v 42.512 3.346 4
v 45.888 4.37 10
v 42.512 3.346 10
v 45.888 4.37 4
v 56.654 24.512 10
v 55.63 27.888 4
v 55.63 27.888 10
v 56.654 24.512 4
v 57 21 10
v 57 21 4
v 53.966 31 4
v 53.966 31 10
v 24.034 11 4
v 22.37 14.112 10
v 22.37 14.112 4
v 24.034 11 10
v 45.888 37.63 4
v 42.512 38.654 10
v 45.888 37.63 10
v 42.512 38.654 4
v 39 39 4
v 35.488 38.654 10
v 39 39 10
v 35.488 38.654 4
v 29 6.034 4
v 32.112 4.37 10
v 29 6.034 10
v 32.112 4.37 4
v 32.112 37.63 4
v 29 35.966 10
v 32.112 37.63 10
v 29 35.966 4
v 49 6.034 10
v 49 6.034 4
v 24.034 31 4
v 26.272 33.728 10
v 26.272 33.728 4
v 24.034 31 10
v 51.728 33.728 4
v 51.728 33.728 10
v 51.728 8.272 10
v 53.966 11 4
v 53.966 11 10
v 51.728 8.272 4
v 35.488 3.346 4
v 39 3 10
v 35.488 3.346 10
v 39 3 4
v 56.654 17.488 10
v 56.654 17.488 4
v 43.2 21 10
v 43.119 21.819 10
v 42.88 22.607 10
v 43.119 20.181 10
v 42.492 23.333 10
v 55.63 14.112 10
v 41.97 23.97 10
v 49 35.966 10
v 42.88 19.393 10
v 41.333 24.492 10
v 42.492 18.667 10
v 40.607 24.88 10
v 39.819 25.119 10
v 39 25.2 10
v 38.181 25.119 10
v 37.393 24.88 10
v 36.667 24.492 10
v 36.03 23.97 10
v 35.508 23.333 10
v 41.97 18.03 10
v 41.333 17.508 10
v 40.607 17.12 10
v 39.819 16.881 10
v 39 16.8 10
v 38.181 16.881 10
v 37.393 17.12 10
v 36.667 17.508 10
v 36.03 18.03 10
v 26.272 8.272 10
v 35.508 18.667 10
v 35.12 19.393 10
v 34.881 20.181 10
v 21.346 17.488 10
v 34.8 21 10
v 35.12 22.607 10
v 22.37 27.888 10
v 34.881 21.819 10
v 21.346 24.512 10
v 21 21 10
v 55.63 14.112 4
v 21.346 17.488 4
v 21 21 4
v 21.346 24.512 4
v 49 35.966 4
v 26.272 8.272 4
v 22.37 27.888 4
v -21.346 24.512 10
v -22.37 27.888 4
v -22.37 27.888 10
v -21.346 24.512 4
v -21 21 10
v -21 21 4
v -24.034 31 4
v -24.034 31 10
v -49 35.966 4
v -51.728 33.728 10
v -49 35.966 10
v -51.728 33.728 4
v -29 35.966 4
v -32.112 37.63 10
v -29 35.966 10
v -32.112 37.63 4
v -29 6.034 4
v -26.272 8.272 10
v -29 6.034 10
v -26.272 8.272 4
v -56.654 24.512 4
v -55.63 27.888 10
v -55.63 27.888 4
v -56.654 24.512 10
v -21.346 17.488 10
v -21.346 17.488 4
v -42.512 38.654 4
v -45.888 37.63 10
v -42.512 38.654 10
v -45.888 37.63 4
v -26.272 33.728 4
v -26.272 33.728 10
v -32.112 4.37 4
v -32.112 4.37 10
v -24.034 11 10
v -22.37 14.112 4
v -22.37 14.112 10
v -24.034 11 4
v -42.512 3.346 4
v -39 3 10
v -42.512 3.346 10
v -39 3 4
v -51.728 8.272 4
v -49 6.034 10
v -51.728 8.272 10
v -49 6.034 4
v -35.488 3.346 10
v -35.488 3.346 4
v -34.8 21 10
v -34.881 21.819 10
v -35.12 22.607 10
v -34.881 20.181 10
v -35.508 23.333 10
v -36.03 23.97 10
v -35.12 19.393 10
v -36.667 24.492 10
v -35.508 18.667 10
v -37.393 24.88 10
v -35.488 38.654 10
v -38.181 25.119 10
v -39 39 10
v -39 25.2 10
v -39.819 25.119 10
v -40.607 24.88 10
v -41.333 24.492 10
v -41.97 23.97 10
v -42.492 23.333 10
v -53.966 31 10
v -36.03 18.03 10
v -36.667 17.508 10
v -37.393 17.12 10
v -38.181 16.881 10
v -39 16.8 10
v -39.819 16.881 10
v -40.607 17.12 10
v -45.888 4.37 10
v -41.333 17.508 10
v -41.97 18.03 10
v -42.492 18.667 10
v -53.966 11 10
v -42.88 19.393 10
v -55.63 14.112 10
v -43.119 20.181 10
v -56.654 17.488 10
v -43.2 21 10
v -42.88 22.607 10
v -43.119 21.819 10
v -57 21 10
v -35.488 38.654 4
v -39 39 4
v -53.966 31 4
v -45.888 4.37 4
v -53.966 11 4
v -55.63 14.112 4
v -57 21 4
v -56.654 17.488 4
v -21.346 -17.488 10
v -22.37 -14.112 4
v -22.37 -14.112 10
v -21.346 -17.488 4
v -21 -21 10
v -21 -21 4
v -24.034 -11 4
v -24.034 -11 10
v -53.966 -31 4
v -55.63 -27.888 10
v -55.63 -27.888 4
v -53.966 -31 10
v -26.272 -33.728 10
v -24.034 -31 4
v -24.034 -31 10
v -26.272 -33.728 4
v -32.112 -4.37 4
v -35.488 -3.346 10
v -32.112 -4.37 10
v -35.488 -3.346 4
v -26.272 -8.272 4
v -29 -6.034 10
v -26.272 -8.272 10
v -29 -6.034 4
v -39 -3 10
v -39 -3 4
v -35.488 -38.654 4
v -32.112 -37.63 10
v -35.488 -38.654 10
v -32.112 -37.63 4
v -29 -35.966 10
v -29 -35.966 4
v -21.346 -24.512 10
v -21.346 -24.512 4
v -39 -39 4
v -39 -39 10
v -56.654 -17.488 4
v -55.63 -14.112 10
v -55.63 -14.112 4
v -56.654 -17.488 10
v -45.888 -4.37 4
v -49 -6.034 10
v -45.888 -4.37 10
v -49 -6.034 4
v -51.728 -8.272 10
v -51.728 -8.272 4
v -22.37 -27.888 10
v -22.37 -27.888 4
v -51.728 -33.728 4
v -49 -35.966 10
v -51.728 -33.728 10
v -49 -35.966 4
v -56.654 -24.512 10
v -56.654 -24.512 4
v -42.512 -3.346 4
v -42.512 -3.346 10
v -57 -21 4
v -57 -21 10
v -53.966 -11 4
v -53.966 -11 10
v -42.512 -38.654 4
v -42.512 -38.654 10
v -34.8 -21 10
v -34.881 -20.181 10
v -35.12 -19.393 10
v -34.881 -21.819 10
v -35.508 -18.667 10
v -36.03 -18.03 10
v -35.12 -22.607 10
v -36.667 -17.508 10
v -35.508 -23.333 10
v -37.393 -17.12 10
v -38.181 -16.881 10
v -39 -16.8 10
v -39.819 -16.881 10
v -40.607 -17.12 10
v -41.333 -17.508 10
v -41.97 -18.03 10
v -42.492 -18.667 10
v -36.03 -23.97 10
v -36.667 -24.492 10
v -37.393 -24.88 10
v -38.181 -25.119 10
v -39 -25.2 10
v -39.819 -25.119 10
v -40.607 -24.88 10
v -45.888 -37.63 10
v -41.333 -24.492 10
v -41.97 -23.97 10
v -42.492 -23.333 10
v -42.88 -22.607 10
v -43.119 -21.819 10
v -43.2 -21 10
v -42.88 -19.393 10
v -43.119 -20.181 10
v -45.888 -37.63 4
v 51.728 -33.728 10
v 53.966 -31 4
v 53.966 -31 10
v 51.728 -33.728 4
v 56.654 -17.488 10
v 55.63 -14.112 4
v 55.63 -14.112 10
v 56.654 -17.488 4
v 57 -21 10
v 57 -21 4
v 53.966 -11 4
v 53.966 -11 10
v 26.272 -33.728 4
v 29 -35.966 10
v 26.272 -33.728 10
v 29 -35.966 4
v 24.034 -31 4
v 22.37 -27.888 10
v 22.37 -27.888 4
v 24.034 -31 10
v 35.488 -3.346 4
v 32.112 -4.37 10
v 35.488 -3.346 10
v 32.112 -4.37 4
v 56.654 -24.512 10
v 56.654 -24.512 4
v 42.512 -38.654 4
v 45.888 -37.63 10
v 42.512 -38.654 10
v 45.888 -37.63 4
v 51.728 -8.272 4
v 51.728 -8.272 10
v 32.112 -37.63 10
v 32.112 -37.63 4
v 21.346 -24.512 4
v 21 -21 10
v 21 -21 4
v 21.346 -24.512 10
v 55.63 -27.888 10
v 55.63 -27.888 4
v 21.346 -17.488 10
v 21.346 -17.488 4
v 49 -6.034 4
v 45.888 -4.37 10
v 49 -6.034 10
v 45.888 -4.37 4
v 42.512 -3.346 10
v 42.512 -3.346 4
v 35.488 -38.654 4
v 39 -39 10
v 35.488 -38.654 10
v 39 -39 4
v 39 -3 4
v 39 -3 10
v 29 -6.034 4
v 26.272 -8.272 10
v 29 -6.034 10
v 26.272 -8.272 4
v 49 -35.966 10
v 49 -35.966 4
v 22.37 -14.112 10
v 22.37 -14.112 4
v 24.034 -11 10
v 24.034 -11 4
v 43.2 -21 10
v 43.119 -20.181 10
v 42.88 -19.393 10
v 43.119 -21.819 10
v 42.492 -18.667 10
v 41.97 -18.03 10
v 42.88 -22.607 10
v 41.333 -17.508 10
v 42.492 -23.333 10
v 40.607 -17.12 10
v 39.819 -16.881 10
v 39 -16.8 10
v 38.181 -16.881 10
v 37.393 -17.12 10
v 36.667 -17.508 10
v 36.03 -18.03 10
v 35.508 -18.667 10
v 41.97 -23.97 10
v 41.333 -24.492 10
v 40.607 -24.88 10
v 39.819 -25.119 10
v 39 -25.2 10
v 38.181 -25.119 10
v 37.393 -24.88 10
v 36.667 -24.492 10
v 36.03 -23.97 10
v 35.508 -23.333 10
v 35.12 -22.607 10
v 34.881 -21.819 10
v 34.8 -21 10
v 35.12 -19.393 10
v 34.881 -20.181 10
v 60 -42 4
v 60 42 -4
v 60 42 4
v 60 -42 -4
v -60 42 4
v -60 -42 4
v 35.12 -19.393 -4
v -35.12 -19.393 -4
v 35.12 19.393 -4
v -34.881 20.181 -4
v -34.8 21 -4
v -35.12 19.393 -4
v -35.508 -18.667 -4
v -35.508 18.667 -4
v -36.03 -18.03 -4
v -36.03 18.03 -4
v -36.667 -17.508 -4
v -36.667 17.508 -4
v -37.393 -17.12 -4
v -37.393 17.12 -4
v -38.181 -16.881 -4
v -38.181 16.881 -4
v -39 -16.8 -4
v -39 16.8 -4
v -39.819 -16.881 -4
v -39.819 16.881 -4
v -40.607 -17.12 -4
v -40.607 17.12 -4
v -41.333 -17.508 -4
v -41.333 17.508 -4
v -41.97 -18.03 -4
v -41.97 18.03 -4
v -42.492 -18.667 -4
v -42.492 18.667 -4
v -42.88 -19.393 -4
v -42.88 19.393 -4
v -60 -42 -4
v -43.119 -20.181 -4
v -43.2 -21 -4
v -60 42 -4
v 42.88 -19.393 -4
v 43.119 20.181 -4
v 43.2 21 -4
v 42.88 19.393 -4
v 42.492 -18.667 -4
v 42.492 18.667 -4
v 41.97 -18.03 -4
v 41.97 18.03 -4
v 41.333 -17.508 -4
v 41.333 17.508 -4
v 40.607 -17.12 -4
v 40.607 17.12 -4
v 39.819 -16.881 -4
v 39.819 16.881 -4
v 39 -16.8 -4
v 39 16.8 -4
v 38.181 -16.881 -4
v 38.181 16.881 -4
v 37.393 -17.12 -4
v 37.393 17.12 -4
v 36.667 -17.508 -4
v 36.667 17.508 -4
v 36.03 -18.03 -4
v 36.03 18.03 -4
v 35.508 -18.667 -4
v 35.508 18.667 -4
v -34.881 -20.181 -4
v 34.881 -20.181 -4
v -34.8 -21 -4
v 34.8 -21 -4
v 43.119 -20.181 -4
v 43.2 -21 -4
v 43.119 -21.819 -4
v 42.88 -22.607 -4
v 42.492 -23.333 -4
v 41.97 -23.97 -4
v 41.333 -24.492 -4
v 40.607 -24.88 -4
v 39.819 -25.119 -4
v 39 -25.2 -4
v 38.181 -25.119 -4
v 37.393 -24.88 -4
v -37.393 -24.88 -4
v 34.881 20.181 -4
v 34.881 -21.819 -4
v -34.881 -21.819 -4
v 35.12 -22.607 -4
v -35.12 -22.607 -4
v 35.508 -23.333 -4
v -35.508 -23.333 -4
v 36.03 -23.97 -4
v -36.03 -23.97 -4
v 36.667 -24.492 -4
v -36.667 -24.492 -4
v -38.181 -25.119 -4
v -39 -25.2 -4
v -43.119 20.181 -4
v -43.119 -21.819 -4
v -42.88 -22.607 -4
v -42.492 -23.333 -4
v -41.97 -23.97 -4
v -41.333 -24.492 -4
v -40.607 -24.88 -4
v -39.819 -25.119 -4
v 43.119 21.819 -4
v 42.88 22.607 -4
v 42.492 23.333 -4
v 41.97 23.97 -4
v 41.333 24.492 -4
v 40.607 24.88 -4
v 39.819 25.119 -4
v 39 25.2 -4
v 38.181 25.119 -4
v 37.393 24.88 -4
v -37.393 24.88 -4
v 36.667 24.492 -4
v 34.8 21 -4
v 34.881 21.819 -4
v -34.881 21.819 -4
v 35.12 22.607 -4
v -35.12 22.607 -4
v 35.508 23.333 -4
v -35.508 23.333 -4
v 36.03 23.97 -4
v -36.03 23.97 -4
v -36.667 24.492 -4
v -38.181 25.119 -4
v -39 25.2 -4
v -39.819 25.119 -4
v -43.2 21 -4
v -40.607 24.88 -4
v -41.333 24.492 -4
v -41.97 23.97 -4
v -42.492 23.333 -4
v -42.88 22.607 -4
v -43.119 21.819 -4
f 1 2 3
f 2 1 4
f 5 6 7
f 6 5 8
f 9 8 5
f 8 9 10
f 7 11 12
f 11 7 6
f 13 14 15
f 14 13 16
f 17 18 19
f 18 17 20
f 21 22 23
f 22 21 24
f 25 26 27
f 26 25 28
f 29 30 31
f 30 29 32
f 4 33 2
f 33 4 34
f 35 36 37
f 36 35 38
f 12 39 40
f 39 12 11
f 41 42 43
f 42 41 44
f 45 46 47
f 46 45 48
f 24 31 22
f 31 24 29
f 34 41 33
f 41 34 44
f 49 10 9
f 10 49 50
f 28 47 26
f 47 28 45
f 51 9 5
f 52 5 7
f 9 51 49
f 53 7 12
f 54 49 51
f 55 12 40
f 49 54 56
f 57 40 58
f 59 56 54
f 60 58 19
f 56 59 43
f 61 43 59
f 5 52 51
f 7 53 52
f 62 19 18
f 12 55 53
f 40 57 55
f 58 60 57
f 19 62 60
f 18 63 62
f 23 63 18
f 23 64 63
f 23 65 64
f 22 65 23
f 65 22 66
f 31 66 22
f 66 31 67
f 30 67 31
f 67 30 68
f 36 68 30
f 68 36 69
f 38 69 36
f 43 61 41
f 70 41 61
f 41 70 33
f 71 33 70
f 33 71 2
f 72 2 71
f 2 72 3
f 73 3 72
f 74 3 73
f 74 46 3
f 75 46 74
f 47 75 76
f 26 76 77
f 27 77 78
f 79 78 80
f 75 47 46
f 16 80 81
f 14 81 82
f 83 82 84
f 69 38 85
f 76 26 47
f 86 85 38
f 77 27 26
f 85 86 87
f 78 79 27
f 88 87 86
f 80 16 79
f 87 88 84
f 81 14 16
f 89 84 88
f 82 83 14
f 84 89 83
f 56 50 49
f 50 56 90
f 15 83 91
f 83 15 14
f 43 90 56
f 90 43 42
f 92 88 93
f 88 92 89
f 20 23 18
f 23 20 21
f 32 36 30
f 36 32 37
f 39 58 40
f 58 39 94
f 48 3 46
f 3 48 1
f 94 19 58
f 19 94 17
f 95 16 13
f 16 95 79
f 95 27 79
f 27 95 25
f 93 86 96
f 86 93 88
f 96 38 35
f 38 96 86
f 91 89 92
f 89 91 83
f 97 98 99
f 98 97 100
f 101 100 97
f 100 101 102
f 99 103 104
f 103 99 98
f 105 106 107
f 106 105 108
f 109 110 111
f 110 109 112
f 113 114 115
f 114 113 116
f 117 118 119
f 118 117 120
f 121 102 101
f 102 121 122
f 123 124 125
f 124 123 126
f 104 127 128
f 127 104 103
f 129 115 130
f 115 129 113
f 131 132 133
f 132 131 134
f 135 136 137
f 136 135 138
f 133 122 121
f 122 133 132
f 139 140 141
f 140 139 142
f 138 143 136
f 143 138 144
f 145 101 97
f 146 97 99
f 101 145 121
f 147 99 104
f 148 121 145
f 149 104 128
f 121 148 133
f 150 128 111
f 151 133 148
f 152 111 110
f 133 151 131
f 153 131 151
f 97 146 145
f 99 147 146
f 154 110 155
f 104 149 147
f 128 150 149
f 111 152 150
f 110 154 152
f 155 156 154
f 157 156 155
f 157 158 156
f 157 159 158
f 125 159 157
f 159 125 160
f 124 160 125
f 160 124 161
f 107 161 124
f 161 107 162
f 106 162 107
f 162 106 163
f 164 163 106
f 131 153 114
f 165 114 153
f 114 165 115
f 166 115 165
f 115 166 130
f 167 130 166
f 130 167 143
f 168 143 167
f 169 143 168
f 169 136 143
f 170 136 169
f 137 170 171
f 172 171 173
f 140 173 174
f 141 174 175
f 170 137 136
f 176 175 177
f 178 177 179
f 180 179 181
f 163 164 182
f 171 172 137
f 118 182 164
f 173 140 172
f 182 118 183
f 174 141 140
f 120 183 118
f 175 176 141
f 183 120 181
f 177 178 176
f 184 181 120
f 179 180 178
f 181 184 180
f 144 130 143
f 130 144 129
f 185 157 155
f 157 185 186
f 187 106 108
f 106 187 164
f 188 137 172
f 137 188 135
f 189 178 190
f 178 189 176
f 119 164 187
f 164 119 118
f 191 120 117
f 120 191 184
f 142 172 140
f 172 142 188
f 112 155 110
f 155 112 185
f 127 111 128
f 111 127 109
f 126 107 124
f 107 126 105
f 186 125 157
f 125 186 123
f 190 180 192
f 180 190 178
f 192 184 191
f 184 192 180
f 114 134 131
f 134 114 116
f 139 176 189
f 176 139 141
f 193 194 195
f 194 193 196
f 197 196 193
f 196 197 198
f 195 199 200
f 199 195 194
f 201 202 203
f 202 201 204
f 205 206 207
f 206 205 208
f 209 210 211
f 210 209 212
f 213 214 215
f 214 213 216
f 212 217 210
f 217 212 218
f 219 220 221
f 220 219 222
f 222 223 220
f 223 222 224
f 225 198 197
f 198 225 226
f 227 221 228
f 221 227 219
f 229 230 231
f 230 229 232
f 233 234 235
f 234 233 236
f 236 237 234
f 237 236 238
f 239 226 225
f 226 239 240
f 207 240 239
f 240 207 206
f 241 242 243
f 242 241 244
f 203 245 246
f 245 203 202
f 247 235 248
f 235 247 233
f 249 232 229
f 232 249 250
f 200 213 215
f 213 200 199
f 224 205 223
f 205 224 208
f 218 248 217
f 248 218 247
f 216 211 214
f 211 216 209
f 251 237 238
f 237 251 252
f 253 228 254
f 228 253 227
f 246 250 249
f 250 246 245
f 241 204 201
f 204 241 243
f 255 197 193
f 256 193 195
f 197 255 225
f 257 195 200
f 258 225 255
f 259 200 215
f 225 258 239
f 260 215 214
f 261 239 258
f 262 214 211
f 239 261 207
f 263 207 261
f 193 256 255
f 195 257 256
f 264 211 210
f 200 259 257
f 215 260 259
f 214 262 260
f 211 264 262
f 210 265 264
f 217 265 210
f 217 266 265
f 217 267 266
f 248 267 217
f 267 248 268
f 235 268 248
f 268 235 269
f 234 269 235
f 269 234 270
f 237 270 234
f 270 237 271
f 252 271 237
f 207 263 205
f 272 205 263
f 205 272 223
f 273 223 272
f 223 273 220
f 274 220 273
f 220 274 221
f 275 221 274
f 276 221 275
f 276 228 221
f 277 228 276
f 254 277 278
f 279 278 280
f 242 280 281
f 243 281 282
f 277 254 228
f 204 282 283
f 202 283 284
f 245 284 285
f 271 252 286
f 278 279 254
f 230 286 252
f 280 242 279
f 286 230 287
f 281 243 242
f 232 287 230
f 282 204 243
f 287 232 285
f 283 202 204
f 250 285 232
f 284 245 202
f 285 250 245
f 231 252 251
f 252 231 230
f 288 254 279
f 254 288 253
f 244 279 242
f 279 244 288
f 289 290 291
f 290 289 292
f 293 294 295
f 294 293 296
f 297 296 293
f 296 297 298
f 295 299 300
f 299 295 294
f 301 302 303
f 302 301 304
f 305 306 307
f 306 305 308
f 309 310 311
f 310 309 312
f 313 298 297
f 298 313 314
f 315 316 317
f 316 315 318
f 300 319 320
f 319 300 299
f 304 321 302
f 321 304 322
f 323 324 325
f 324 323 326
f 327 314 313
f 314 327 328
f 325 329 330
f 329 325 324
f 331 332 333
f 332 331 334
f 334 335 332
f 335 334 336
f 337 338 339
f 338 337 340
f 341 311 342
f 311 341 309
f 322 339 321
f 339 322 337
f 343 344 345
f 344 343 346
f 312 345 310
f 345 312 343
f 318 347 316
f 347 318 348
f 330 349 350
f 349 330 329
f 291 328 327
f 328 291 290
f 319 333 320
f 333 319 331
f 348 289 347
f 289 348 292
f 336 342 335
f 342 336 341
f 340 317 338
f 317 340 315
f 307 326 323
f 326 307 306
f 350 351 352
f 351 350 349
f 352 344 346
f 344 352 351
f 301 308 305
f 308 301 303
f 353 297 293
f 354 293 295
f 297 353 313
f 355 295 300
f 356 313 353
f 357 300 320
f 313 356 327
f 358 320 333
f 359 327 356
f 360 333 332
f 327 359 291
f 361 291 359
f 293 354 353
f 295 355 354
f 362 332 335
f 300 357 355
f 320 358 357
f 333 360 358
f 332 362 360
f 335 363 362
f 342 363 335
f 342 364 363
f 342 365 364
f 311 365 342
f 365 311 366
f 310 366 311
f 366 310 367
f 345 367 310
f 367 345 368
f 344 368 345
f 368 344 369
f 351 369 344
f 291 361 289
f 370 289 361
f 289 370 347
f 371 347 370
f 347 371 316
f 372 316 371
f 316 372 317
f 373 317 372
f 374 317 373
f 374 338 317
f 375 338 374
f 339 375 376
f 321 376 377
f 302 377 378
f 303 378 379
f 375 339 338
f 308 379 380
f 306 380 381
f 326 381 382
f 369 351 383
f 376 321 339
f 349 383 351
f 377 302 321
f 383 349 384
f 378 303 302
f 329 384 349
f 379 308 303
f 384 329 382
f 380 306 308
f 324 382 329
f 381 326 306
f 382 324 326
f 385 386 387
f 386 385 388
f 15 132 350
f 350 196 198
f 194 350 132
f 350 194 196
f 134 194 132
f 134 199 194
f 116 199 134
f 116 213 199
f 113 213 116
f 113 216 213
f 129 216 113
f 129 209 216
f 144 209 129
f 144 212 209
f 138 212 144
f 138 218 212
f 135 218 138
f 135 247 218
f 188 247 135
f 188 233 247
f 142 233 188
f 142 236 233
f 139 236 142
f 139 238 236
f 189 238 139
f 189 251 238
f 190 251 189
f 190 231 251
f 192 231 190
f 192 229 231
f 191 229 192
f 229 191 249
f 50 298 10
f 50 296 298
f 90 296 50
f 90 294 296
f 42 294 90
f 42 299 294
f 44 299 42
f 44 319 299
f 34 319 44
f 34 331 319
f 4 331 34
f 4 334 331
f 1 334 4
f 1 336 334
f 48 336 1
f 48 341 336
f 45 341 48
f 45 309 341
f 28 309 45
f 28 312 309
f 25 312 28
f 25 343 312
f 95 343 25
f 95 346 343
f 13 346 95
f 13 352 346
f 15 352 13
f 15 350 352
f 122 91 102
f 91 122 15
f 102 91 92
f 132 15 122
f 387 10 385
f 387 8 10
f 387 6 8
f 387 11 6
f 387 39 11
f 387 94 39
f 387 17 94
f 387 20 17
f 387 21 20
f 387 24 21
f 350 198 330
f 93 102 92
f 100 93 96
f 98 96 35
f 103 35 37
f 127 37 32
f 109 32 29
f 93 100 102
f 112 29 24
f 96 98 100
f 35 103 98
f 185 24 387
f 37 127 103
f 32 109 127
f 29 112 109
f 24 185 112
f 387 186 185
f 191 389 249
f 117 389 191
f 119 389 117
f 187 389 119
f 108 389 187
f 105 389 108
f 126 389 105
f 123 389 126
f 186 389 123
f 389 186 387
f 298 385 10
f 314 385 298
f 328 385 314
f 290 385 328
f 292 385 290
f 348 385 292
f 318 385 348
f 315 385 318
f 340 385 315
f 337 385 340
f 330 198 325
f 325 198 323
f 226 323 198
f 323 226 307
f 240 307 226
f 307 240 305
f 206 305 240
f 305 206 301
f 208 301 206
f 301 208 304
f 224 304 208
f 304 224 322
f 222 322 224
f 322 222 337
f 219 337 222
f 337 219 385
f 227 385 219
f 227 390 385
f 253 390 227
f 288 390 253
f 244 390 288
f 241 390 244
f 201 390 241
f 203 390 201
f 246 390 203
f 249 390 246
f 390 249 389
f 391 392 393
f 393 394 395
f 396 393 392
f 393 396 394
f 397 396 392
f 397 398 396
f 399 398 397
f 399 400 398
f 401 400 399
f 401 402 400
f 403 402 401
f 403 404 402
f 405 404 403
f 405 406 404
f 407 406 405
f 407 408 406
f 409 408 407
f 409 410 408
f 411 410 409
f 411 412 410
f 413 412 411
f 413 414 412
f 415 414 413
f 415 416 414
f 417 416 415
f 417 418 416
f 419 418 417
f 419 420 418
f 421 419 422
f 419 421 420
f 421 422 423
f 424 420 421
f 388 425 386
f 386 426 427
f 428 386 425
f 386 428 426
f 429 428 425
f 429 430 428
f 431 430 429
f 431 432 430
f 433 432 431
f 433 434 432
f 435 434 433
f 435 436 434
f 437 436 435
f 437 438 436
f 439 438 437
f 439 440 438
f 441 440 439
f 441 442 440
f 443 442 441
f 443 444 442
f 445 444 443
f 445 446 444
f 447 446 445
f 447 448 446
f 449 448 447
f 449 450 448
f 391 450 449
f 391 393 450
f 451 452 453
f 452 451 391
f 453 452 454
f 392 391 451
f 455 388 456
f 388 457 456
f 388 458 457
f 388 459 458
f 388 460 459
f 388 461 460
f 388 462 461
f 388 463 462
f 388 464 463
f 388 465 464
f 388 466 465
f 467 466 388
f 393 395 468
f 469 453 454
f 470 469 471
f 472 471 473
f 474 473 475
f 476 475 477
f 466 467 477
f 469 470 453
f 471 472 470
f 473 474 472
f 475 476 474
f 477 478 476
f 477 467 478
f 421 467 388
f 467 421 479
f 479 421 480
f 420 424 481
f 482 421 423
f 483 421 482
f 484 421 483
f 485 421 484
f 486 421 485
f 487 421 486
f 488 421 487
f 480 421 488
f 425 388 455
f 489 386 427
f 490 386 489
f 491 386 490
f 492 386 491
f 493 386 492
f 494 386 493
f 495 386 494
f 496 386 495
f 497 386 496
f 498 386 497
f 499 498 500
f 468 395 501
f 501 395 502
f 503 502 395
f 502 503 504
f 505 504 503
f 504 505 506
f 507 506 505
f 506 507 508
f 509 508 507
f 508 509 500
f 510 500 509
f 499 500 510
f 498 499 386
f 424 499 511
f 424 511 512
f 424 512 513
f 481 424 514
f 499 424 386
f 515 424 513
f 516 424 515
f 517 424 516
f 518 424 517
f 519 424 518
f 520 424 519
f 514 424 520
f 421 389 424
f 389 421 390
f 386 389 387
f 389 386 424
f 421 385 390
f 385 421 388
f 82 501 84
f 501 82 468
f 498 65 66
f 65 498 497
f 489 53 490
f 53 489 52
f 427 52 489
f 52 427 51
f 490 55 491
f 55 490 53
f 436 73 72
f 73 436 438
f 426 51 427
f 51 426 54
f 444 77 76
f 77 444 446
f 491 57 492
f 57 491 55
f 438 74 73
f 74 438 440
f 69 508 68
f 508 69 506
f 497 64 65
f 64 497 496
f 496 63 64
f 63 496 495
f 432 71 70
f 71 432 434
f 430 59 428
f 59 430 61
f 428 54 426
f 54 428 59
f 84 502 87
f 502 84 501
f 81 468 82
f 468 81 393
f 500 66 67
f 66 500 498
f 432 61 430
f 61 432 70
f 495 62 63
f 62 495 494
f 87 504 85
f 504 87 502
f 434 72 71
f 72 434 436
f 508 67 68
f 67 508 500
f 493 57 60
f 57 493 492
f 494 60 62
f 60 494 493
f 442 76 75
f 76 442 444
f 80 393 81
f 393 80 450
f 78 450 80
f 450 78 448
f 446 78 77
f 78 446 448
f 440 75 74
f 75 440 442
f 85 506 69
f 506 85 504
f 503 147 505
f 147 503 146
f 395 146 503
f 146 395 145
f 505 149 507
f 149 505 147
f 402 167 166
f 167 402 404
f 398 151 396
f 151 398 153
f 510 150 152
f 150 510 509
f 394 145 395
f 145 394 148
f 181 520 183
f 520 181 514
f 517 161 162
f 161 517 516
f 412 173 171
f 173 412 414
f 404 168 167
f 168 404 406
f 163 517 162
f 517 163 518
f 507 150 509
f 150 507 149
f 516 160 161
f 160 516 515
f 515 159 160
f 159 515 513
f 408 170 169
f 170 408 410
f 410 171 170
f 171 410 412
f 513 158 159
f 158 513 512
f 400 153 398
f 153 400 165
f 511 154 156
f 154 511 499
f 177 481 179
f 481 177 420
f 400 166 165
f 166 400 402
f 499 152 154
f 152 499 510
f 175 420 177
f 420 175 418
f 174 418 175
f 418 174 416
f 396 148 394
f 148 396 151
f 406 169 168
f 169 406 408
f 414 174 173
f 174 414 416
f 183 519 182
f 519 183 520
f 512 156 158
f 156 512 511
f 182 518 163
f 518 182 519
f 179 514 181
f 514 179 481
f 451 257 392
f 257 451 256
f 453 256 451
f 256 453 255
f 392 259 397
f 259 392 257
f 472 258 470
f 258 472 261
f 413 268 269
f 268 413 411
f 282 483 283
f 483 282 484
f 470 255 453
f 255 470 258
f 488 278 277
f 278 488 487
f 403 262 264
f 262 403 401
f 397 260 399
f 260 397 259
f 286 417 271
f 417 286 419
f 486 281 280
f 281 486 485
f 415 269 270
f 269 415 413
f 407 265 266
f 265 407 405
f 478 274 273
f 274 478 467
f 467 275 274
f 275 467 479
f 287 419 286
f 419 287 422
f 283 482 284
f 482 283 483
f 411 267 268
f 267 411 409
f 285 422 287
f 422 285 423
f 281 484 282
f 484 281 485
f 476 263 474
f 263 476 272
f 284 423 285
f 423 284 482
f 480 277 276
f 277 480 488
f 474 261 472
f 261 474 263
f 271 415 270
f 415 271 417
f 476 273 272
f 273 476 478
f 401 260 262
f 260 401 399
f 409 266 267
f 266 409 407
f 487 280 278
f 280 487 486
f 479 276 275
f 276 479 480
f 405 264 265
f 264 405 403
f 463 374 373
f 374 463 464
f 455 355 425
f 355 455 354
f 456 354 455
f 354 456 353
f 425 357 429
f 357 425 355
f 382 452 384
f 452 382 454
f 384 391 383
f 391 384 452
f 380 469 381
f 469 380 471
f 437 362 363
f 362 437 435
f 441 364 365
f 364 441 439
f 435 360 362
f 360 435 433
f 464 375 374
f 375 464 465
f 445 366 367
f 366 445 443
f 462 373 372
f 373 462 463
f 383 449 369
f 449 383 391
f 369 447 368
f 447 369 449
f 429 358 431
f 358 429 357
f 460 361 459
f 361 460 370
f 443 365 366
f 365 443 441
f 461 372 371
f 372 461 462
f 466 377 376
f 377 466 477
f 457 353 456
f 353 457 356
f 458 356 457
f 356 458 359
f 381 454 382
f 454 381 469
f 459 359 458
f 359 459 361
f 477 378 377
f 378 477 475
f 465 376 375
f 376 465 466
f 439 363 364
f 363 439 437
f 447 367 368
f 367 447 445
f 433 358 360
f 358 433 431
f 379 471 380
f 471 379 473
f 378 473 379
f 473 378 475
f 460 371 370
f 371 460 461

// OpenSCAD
$fn = 32;

// ----------------------------------------------------------------------
// Anchor pads 120 x 84 x 14
// four corner bosses with anchor holes
// ----------------------------------------------------------------------

// --- parameters (mm) ---
plate = [120, 84, 8];  // base plate size (x, y, z)
pads = 4;              // boss count, one per corner
edge = 21;             // boss centre offset from the plate edge
boss_d = 36;           // boss diameter
boss_h = 6;            // boss height above the base plate
hole_d = 8.4;          // hole diameter

// --- derived feature positions (mm) ---
height = plate[2] + boss_h;      // = 14   overall height of the part
corner_x = plate[0] / 2 - edge;  // = 39   boss centre X
corner_y = plate[1] / 2 - edge;  // = 21   boss centre Y
feature_centers = [
  [corner_x, corner_y],
  [-corner_x, corner_y],
  [-corner_x, -corner_y],
  [corner_x, -corner_y]
];   // boss centres, anchor holes are drilled there

// base plate, four bosses standing on it, anchor holes all the way through
difference() {
  union() {
    cube(plate, center = true);
    for (centre = feature_centers)
      translate([centre[0], centre[1], plate[2] / 2 - 1])
        cylinder(d = boss_d, h = boss_h + 1);
  }
  for (centre = feature_centers)
    translate([centre[0], centre[1], -height])
      cylinder(d = hole_d, h = 2 * height + 2);  // through boss and plate
}
